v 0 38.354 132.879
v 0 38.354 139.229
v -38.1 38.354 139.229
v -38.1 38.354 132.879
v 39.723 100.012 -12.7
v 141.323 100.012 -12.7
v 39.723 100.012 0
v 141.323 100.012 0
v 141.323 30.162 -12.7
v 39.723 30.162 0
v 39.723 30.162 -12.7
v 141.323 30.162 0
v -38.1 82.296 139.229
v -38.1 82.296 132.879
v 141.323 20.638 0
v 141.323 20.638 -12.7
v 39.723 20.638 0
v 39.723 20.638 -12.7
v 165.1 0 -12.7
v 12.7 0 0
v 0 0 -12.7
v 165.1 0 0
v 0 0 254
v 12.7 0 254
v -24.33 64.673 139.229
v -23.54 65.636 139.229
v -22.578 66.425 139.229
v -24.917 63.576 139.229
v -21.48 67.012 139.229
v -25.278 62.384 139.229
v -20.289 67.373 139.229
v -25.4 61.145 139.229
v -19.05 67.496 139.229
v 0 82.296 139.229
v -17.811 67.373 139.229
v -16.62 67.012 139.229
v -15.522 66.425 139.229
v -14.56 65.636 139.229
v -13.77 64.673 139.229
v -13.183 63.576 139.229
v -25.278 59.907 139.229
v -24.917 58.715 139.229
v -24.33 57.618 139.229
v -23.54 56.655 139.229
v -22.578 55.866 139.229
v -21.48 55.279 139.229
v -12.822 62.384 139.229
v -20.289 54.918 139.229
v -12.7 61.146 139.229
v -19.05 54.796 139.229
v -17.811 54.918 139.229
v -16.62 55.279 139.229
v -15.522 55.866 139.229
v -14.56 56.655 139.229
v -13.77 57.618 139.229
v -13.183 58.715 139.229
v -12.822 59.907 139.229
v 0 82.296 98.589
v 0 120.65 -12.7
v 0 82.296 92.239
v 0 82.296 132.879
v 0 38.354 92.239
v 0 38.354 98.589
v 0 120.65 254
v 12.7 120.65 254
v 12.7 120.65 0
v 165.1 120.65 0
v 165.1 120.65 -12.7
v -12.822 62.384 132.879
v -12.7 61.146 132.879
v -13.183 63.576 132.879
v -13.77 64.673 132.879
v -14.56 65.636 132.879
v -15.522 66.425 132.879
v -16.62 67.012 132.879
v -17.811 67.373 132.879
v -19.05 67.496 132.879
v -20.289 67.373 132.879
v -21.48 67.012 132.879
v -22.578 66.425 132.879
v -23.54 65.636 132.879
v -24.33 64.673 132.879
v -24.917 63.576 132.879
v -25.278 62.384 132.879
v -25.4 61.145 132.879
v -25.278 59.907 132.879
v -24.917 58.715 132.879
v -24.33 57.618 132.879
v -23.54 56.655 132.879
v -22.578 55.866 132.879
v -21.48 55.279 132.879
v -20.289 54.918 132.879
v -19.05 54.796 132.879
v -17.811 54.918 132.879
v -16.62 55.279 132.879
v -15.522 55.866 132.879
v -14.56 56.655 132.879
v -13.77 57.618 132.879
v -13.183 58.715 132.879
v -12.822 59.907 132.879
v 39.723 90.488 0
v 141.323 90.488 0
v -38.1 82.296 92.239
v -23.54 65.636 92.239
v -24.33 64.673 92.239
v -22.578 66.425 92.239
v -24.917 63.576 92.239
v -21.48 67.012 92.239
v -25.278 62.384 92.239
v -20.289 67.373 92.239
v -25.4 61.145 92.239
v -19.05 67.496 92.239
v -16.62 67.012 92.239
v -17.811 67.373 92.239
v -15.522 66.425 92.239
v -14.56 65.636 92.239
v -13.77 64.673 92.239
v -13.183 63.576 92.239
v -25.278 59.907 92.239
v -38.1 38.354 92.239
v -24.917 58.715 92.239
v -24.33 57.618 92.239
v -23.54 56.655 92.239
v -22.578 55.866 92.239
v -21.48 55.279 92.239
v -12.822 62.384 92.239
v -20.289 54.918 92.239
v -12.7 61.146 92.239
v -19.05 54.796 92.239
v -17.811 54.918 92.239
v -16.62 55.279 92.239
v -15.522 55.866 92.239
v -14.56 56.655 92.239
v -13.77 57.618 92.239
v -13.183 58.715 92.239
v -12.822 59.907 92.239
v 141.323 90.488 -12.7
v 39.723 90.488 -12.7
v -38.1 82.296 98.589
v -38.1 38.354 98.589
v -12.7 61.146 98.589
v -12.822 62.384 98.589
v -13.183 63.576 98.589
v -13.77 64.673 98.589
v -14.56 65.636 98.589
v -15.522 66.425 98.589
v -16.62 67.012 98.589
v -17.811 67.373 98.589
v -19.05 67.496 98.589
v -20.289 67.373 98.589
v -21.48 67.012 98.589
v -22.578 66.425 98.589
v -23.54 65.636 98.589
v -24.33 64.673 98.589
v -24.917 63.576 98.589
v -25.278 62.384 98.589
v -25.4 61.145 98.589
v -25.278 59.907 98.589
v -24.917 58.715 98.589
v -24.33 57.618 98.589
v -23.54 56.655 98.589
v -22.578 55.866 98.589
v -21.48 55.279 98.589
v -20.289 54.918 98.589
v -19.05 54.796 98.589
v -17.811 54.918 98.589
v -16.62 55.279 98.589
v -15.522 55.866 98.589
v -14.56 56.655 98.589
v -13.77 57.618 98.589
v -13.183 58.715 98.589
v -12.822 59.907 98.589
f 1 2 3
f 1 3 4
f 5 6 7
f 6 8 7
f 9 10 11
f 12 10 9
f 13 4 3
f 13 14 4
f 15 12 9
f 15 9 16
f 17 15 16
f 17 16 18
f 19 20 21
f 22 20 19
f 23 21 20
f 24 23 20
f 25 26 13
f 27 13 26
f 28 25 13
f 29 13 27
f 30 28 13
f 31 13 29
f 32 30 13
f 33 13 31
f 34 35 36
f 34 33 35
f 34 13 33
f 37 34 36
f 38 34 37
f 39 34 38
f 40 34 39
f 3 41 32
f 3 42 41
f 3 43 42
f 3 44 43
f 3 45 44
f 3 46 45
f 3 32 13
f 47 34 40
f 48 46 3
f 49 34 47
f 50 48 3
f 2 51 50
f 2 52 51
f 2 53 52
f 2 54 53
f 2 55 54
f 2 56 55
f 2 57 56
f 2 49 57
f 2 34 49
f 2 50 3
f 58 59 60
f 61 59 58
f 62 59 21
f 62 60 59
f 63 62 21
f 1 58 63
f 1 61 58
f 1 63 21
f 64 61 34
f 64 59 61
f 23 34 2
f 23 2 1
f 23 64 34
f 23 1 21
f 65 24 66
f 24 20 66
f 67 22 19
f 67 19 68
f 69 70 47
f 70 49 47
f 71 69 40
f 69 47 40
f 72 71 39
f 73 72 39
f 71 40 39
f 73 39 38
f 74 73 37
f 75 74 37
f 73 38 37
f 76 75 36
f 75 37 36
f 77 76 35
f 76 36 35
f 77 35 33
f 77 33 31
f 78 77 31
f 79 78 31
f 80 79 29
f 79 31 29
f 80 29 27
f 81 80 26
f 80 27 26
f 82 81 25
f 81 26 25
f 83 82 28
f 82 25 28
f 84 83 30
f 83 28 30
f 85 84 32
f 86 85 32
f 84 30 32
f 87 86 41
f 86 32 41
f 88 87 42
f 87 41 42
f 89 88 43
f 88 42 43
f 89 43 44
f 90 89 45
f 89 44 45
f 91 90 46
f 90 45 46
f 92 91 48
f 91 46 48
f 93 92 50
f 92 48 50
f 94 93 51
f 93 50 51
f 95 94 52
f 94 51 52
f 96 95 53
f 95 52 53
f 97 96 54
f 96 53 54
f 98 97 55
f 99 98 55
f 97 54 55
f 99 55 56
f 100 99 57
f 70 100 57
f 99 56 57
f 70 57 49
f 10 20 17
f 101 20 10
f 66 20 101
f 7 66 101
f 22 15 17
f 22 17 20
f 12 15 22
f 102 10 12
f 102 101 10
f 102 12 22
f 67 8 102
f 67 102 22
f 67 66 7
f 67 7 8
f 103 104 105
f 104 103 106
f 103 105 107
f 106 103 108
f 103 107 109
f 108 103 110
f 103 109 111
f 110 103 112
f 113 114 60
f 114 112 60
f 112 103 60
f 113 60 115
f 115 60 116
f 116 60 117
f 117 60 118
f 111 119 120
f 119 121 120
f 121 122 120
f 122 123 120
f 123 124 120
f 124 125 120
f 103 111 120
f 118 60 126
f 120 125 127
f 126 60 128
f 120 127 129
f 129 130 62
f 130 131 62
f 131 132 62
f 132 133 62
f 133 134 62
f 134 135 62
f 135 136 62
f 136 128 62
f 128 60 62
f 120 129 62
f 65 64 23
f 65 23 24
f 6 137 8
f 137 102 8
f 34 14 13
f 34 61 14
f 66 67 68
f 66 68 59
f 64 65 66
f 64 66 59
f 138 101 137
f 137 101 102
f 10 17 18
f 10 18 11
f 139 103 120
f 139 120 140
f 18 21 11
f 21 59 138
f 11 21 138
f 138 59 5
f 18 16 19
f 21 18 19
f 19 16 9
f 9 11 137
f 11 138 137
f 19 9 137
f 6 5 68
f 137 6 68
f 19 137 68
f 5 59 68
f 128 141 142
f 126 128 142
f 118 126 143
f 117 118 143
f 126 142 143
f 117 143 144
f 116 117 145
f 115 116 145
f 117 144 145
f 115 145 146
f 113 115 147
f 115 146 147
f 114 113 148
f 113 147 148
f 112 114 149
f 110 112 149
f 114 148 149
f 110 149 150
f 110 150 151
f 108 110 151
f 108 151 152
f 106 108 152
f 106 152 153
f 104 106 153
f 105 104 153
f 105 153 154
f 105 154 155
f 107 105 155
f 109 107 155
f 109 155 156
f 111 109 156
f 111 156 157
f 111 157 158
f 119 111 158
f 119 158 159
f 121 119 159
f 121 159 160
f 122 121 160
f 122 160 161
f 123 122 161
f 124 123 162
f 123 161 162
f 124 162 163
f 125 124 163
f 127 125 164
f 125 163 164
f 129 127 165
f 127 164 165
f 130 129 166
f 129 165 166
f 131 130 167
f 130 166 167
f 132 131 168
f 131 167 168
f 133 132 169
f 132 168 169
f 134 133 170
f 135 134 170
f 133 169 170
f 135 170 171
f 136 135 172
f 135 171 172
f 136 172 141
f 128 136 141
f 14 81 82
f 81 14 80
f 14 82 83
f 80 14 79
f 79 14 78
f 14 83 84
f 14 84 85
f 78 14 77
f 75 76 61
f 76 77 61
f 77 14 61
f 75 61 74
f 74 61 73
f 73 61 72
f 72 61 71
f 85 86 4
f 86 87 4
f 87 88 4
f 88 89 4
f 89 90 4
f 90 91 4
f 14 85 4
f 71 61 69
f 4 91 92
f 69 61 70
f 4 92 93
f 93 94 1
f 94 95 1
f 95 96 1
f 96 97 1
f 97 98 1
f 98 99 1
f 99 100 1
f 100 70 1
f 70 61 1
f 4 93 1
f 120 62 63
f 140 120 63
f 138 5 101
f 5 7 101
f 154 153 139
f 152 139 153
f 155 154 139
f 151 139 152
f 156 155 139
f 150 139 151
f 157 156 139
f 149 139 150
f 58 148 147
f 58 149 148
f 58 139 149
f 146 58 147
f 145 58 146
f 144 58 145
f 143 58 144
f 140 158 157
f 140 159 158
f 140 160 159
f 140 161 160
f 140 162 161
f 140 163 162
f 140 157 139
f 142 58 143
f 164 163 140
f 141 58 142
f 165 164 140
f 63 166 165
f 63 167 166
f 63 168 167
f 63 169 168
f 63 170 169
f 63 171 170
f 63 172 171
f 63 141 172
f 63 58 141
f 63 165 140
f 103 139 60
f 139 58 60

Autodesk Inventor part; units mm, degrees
ref_plane "YZ Plane" through (0, 0, 0) normal (1, 0, 0) x (0, 1, 0)
ref_plane "XZ Plane" through (0, 0, 0) normal (0, 1, 0) x (-1, 0, 0)
ref_plane "XY Plane" through (0, 0, 0) normal (0, 0, 1) x (1, 0, 0)
sketch "Sketch1" plane through (0, 0, 0) normal (0, 0, 1) x (1, 0, 0)
  line L0 (0, 0) -> (165.1, 0)
  line L1 (165.1, 0) -> (165.1, 120.65)
  line L2 (165.1, 120.65) -> (0, 120.65)
  line L3 (0, 120.65) -> (0, 0)
  dimension "d0" = 165.1
  dimension "d1" = 120.65
extrude "Extrusion1" add sketch "Sketch1" against normal blind 12.7
sketch "Sketch2" plane through (0, 0, 0) normal (0, 0, 1) x (1, 0, 0)
  line L0 (165.1, 0) -> (0, 0) projected
  line L1 (0, 120.65) -> (165.1, 120.65) projected
  line L2 (0, 0) -> (12.7, 0)
  line L3 (12.7, 0) -> (12.7, 120.65)
  line L4 (12.7, 120.65) -> (0, 120.65)
  line L5 (0, 120.65) -> (0, 0)
  dimension "d4" = 12.7
extrude "Extrusion2" add sketch "Sketch2" along normal blind 254
sketch "Sketch5" plane through (0, 0, 0) normal (0, 0, 1) x (1, 0, 0)
  point P0 (0, 0)
sketch "Sketch7" plane through (0, 0, 0) normal (0, 0, 1) x (1, 0, 0)
  line L0 (165.1, 120.65) -> (165.1, 0) projected
  line L1 (165.1, 60.325) -> (0, 60.325)
  line L2 (0, 0) -> (0, 120.65) projected
  line L3 (39.7226, 30.1625) -> (141.3226, 30.1625)
  line L4 (141.3226, 30.1625) -> (141.3226, 20.6375)
  line L5 (141.3226, 20.6375) -> (39.7226, 20.6375)
  line L6 (39.7226, 20.6375) -> (39.7226, 30.1625)
  line L7 (39.7226, 90.4875) -> (141.3226, 90.4875)
  line L8 (141.3226, 90.4875) -> (141.3226, 100.0125)
  line L9 (141.3226, 100.0125) -> (39.7226, 100.0125)
  line L10 (39.7226, 100.0125) -> (39.7226, 90.4875)
  point P0 (118.0813, 25.4)
  point P1 (118.0813, 95.25)
  dimension "d20" = 101.6
  dimension "d21" = 9.525
  dimension "d33" = 4.7625
  dimension "d34" = 4.7625
hole "Hole1" [suppressed]
extrude "Extrusion7" cut sketch "Sketch7" against normal blind 25.4
sketch "Sketch8" plane through (0, 0, -12.7) normal (-1, 0, 0) x (0, 0, 1)
  line L0 (266.7, 120.65) -> (266.7, 0) projected
  line L1 (266.7, 60.325) -> (0, 60.325)
  line L2 (0, 0) -> (0, 120.65) projected
  line L3 (128.4341, 144.8996) -> (128.4341, -24.2496)
  line L4 (145.5791, 60.325) -> (145.5791, 38.354)
  line L5 (145.5791, 60.325) -> (145.5791, 82.296)
  line L6 (111.2891, 60.325) -> (111.2891, 38.354)
  line L7 (111.2891, 60.325) -> (111.2891, 82.296)
  line L8 (145.5791, 82.296) -> (151.9291, 82.296)
  line L9 (151.9291, 82.296) -> (151.9291, 38.354)
  line L10 (151.9291, 38.354) -> (145.5791, 38.354)
  line L11 (145.5791, 38.354) -> (145.5791, 82.296)
  line L12 (111.2891, 82.296) -> (104.9391, 82.296)
  line L13 (104.9391, 82.296) -> (104.9391, 38.354)
  line L14 (104.9391, 38.354) -> (111.2891, 38.354)
  line L15 (111.2891, 38.354) -> (111.2891, 82.296)
  point P0 (12.7, 0)
  dimension "d35" = 17.145
  dimension "d36" = 21.971
  dimension "d37" = 21.971
  dimension "d38" = 6.35
  dimension "d39" = 6.35
extrude "Extrusion8" add sketch "Sketch8" along normal blind 38.1
sketch "Sketch9" plane through (0, 38.354, 139.2291) normal (0, 0, 1) x (1, 0, 0)
  line L0 (0, 82.296) -> (0, -38.354) projected
  circle A0 centre (-19.05, 22.7915) radius 6.35
  point P0 (0, 22.7915)
  dimension "d42" = 19.05
  dimension "d43" = 12.7
extrude "Extrusion9" cut sketch "Sketch9" against normal blind 50.8
properties part number "LucasCharles part11 final" material "Stainless Steel, Austenitic"
